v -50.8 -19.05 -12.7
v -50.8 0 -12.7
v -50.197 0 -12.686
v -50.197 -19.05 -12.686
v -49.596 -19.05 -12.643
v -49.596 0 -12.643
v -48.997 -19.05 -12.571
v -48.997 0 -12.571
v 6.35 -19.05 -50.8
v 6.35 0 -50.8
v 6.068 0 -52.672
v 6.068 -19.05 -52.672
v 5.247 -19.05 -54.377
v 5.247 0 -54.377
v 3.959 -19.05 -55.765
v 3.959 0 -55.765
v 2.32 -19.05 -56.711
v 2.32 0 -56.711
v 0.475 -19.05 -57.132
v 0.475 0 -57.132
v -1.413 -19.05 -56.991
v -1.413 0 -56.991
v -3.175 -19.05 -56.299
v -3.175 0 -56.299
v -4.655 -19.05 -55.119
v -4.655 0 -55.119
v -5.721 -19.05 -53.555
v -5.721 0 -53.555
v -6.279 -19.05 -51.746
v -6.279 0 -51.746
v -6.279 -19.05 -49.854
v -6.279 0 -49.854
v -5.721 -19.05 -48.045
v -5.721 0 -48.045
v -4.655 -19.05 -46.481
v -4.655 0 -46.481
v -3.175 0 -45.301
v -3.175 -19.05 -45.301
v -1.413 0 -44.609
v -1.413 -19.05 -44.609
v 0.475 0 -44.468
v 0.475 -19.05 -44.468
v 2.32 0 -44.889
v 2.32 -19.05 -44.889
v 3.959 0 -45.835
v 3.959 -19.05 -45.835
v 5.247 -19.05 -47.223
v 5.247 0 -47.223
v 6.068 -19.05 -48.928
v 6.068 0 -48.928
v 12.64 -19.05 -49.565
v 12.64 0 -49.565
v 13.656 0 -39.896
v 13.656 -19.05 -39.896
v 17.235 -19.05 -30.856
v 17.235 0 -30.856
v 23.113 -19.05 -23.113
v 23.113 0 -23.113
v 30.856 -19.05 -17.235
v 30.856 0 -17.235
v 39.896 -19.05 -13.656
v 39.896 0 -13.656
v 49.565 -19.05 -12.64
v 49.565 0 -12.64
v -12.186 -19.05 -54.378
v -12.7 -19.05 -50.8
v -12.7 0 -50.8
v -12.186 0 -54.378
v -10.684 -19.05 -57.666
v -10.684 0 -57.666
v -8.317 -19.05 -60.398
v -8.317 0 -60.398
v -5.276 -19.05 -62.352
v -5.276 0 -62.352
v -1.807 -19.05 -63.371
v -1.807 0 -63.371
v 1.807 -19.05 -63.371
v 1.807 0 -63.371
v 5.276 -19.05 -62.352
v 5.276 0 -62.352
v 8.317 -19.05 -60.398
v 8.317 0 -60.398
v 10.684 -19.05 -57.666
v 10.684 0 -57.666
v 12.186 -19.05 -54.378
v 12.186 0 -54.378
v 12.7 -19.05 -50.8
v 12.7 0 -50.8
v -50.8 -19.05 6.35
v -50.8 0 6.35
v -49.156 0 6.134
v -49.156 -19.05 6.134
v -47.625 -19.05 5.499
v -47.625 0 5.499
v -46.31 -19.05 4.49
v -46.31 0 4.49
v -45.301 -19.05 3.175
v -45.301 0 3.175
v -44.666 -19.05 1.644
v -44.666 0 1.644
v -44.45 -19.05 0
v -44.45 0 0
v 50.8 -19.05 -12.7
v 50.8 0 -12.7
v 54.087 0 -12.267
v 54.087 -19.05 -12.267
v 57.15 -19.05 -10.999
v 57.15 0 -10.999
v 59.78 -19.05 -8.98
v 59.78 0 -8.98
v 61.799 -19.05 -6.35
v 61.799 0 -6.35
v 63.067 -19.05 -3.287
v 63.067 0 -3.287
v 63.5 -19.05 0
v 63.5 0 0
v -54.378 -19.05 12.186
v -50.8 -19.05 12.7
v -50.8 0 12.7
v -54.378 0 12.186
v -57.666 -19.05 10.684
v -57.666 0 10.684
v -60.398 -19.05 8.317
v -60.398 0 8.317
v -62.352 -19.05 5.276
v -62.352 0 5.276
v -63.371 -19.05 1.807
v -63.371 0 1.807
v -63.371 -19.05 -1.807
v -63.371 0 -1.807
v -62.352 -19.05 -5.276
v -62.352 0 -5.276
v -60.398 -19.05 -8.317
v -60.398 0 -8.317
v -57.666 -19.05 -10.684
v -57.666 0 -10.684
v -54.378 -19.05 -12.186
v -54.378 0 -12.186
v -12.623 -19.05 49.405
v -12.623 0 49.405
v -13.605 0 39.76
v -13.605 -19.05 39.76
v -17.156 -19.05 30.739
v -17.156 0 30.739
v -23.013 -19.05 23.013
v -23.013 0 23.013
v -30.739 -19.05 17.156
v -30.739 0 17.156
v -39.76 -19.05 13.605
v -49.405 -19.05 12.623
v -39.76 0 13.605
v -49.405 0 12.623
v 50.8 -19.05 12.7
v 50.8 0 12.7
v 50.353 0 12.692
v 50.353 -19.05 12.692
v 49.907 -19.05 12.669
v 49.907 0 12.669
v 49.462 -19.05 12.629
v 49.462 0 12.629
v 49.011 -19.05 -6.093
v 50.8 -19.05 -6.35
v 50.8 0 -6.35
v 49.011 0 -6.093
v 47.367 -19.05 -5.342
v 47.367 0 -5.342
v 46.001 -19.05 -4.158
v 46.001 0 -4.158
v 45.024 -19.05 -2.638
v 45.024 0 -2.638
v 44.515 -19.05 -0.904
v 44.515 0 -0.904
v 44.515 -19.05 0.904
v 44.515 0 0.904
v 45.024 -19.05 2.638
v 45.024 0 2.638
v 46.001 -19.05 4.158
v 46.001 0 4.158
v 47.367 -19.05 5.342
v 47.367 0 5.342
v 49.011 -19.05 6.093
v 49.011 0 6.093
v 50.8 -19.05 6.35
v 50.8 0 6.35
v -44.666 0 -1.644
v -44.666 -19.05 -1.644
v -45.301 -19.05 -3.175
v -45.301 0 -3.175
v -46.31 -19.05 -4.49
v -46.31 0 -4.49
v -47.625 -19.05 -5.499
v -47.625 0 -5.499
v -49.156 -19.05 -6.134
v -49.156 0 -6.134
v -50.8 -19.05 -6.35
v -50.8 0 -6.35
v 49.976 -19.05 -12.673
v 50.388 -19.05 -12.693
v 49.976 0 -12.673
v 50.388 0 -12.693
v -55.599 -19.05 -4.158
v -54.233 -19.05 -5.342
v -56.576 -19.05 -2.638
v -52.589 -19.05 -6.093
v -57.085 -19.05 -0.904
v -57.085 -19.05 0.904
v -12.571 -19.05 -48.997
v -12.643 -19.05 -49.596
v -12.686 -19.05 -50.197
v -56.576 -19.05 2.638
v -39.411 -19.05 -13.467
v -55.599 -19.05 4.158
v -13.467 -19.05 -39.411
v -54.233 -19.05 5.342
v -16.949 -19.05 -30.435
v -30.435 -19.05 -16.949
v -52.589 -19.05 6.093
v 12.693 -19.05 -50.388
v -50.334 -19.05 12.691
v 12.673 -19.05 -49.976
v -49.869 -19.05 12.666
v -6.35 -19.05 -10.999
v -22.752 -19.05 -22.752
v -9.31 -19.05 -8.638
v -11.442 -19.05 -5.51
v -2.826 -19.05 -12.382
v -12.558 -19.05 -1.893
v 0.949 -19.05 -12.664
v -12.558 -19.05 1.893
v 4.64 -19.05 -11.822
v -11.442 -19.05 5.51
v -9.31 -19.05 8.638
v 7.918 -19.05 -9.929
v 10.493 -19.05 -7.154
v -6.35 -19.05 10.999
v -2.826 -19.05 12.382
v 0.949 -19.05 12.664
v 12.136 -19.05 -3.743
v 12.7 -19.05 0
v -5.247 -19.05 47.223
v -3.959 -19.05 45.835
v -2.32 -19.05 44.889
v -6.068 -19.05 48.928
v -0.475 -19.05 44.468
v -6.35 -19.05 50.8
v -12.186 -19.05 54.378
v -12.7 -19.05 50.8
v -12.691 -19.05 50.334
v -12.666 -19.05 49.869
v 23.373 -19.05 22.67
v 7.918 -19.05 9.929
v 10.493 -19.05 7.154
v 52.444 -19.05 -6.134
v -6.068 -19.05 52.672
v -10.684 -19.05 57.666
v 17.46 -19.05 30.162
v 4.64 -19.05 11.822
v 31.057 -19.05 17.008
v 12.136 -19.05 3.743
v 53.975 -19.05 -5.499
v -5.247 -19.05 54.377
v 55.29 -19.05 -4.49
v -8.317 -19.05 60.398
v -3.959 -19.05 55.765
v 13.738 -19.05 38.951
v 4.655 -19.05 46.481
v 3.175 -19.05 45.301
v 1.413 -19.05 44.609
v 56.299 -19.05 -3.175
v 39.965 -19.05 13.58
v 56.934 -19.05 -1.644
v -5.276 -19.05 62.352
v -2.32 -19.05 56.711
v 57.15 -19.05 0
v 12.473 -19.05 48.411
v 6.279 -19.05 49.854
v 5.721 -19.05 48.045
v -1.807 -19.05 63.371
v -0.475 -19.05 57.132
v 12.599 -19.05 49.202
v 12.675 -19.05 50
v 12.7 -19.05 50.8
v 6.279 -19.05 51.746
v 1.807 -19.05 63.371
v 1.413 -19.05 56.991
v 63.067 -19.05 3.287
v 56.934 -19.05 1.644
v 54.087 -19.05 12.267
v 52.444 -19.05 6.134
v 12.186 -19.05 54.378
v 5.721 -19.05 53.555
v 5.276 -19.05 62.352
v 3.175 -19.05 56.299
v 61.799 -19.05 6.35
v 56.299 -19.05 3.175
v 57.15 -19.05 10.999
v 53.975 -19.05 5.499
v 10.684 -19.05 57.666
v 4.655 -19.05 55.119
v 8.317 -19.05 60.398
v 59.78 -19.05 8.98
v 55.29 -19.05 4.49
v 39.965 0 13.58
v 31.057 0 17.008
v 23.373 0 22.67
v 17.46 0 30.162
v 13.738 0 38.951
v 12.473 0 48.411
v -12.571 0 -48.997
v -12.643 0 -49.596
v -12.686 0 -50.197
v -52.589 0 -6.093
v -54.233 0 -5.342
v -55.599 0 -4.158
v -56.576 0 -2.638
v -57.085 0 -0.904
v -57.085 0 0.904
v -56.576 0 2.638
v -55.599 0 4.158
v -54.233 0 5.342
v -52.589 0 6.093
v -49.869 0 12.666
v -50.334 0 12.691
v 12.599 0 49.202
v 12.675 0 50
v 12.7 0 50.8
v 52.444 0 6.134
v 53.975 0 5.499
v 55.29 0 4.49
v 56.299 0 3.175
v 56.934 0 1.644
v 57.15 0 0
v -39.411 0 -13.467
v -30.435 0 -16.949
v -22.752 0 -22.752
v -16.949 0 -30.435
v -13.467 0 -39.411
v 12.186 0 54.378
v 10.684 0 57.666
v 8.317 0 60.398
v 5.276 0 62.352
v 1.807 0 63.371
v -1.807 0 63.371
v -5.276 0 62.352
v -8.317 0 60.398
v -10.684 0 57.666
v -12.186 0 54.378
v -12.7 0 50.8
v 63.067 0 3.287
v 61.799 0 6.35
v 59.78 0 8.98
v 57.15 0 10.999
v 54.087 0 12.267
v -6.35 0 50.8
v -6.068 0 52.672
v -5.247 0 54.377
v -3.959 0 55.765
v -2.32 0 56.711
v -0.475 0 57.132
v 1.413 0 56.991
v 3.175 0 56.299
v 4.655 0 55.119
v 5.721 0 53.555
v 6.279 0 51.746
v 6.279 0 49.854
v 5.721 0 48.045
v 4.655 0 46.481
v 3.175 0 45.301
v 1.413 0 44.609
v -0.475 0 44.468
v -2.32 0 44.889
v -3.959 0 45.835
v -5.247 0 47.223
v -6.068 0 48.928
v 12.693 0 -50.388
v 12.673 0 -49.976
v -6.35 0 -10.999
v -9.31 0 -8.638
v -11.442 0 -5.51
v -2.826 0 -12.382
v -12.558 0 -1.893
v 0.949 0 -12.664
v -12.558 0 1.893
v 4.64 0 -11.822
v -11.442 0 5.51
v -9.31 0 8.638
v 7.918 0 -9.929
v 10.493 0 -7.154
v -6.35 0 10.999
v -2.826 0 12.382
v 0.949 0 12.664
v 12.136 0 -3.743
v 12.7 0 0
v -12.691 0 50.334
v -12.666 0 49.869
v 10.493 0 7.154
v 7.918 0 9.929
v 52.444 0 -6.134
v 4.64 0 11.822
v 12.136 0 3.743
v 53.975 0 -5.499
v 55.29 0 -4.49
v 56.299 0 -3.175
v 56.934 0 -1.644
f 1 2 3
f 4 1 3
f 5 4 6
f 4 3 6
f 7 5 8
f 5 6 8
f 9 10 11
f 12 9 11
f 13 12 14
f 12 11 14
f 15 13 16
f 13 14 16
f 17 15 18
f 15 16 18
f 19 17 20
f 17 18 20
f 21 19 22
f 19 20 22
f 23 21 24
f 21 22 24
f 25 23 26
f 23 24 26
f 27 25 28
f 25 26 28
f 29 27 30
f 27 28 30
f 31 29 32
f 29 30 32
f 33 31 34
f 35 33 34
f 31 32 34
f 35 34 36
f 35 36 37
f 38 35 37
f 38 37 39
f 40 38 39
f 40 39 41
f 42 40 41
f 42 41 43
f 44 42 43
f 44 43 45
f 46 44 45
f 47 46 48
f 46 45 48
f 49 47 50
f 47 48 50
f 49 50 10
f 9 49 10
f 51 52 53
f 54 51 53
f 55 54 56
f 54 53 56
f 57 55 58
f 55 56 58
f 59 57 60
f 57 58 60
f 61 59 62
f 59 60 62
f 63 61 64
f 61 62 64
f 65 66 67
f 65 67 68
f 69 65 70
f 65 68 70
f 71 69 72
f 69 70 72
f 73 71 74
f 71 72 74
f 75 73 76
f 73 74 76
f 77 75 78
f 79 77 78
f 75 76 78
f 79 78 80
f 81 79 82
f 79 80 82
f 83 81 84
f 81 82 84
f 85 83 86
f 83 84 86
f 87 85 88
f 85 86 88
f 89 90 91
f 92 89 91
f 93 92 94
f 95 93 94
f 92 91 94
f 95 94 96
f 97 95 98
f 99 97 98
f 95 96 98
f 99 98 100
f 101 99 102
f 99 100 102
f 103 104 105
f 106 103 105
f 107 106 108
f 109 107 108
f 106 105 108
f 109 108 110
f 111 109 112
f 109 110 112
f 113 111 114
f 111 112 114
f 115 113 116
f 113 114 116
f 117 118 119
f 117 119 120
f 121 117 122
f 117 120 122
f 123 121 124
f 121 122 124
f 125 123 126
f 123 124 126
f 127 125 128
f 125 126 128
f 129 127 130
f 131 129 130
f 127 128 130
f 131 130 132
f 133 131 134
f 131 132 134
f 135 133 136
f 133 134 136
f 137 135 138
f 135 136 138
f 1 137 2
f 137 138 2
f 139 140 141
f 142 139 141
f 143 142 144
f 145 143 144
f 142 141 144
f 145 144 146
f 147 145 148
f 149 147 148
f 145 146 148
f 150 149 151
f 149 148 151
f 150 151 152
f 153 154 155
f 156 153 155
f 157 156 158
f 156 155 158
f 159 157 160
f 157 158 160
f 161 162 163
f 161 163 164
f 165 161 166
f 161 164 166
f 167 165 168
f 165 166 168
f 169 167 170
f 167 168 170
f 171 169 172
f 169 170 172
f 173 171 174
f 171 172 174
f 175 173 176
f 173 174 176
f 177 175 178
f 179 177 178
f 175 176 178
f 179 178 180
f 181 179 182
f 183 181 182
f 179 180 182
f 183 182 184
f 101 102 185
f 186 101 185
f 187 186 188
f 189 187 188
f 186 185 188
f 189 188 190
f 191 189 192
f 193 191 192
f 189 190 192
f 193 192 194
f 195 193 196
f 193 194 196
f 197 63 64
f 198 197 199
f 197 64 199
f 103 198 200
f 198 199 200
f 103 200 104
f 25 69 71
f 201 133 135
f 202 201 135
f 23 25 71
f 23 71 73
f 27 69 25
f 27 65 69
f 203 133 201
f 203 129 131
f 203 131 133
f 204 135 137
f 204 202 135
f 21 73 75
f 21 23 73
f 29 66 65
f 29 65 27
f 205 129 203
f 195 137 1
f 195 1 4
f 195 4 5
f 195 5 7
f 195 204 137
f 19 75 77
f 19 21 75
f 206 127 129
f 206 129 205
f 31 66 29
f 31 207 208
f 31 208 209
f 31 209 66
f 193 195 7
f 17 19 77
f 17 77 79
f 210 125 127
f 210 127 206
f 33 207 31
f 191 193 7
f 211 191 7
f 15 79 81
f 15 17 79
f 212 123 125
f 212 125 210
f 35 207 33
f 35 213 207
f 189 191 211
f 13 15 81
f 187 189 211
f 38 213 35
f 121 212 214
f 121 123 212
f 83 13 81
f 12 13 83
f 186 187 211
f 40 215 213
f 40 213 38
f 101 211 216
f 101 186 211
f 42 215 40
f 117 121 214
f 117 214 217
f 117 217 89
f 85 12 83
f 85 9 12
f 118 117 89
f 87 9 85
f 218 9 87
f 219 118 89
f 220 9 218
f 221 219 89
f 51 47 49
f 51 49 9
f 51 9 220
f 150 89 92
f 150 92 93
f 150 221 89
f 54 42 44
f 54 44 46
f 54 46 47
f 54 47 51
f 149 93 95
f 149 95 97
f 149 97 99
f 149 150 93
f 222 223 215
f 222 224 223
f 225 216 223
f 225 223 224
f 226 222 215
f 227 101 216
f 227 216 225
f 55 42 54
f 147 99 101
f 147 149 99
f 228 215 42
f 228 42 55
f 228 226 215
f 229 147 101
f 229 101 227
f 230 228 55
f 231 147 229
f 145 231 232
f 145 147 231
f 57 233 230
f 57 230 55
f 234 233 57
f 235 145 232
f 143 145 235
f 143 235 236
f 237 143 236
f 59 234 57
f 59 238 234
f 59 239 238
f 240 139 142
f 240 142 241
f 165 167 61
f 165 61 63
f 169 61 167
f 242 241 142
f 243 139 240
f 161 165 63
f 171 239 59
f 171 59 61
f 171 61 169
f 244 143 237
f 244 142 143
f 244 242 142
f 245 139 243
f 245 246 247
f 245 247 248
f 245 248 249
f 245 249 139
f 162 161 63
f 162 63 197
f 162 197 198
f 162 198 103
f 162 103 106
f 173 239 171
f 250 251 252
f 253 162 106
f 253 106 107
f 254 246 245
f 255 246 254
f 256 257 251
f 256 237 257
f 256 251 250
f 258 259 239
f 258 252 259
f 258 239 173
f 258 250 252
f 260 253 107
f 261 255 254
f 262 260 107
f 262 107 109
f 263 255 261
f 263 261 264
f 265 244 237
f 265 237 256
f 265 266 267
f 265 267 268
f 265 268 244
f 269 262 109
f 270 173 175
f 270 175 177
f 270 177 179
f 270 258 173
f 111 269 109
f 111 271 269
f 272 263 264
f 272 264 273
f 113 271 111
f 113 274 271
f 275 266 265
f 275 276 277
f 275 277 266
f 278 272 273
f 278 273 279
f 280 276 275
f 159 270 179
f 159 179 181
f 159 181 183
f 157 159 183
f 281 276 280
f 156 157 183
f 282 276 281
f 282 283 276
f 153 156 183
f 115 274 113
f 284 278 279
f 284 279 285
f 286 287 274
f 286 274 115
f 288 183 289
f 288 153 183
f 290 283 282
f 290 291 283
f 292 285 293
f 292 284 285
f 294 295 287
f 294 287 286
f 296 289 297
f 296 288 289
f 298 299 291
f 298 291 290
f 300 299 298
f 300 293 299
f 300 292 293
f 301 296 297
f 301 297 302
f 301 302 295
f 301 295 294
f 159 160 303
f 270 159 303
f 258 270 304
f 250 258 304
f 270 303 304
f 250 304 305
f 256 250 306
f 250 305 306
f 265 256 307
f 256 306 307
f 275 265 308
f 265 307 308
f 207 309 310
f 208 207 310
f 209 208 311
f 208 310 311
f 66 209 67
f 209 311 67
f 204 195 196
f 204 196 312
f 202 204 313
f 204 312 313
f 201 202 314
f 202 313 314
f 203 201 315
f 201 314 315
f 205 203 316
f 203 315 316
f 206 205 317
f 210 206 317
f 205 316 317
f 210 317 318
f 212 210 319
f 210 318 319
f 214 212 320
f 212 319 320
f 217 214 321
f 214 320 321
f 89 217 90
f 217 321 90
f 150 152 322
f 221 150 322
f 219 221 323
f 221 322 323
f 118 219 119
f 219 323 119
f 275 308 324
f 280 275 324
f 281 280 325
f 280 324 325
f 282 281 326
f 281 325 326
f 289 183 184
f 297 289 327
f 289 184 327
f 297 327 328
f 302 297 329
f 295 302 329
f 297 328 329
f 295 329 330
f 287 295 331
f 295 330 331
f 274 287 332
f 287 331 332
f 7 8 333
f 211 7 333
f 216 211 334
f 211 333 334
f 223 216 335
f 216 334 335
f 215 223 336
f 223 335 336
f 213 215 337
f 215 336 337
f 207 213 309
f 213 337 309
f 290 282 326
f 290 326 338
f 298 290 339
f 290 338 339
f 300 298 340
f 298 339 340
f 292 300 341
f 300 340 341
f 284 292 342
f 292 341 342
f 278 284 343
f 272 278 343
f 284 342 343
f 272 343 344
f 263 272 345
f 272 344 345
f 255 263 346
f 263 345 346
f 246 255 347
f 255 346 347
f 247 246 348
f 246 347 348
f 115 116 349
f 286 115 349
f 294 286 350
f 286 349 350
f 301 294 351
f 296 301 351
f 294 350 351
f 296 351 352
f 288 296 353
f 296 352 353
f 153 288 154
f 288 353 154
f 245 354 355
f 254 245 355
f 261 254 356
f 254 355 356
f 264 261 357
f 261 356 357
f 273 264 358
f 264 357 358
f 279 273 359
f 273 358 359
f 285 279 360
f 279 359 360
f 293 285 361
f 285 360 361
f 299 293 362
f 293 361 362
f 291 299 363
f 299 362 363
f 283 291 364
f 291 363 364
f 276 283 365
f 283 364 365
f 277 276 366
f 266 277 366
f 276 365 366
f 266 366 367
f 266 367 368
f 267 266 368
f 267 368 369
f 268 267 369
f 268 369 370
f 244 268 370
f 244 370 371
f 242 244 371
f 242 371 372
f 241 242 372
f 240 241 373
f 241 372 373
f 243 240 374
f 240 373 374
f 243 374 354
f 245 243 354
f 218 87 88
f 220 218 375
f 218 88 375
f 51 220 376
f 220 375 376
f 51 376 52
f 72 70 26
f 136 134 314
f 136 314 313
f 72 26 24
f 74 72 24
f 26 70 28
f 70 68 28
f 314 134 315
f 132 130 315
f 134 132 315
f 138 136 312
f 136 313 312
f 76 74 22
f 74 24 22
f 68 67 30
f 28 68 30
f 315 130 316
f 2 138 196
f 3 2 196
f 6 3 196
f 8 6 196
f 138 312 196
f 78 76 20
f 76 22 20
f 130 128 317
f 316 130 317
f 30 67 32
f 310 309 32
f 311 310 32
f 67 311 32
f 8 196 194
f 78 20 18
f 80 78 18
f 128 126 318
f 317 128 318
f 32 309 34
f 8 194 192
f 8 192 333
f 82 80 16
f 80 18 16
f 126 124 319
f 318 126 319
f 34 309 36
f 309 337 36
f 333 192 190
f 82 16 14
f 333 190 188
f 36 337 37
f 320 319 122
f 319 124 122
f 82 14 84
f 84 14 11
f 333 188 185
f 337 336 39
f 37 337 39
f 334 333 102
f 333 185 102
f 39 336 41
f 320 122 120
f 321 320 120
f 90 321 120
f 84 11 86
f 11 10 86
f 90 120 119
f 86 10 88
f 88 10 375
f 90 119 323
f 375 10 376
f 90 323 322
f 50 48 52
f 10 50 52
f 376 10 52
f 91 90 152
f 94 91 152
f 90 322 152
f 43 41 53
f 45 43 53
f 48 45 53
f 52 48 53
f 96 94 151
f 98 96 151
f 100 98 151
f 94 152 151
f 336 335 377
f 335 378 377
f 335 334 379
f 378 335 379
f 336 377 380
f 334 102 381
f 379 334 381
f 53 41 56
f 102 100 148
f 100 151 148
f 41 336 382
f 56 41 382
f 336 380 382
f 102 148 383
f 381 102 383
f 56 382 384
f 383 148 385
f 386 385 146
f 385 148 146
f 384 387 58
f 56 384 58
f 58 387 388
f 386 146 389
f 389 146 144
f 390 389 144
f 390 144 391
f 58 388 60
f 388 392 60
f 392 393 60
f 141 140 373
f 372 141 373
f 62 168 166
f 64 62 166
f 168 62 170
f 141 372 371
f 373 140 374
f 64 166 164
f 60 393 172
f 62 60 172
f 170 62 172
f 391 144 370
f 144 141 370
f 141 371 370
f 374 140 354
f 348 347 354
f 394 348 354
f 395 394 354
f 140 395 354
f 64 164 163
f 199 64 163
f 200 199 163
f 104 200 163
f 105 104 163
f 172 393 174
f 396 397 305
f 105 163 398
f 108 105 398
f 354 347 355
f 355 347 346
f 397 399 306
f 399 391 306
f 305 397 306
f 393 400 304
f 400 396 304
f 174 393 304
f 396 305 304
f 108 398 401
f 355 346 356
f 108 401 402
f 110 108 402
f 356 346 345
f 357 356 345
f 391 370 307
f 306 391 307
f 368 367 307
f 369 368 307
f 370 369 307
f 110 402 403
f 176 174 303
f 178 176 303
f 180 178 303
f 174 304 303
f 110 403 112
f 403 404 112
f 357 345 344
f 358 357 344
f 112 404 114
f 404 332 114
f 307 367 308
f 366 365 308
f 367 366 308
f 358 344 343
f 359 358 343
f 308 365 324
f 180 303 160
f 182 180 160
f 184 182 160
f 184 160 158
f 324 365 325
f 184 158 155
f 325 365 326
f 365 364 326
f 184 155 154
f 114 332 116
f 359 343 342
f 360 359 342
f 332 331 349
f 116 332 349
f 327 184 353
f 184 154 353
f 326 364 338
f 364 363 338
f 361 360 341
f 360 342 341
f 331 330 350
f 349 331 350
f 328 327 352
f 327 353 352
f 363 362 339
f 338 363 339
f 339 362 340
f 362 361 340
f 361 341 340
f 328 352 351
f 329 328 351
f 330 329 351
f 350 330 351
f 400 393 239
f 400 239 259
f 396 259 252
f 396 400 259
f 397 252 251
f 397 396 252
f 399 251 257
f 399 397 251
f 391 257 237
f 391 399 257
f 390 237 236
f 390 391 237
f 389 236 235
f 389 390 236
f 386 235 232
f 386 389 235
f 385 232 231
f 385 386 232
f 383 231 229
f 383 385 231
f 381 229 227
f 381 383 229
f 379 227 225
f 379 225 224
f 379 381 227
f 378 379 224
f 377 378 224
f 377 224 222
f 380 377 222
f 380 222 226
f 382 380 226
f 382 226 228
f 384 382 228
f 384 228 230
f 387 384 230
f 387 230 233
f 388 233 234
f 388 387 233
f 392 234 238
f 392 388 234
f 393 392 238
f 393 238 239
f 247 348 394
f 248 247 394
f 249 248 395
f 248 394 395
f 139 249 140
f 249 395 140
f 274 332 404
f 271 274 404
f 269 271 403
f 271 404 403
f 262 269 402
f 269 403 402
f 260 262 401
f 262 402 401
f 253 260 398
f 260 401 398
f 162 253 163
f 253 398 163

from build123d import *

# Parameters (mm, degrees)
F0_R     = 12.7
F1_DEPTH = 19.05


with BuildPart() as f1:
    # F0 (on Front) → F1 (new body)
    with BuildSketch(Plane.XZ):
        with BuildLine():
            Line((12.5552676618, 50.8), (6.35, 50.8))
            ThreePointArc((6.35, 50.8), (0, 44.45), (-6.35, 50.8))
            Line((-6.35, 50.8), (-12.7, 50.8))
            ThreePointArc((-12.7, 50.8), (-12.6547477412, 50.1030744688), (-12.623195922, 49.4053944235))
            ThreePointArc((-12.623195922, 49.4053944235), (-0.5027005097, 38.1099530262), (12.4733220574, 48.4112269151))
            ThreePointArc((12.4733220574, 48.4112269151), (12.4943375608, 49.6062980822), (12.5552676618, 50.8))
        make_face()
        with BuildLine():
            ThreePointArc((-6.35, 50.8), (0, 57.15), (6.35, 50.8))
            Line((6.35, 50.8), (12.5552676618, 50.8))
            Line((12.5552676618, 50.8), (12.7, 50.8))
            ThreePointArc((12.7, 50.8), (0, 63.5), (-12.7, 50.8))
            Line((-12.7, 50.8), (-6.35, 50.8))
        make_face()
        with BuildLine():
            Line((12.7, 50.8), (12.5552676618, 50.8))
            ThreePointArc((12.5552676618, 50.8), (12.4943375608, 49.6062980822), (12.4733220574, 48.4112269151))
            ThreePointArc((12.4733220574, 48.4112269151), (12.6432035127, 49.6002479693), (12.7, 50.8))
        make_face()
        with BuildLine():
            ThreePointArc((-12.623195922, 49.4053944235), (-12.6547477412, 50.1030744688), (-12.7, 50.8))
            ThreePointArc((-12.7, 50.8), (-12.6807844436, 50.1016405688), (-12.623195922, 49.4053944235))
        make_face()
        with BuildLine():
            ThreePointArc((49.4621205903, 12.6293340555), (23.373403019, 22.6698095536), (12.4733220574, 48.4112269151))
            ThreePointArc((12.4733220574, 48.4112269151), (-0.5027005097, 38.1099530262), (-12.623195922, 49.4053944235))
            ThreePointArc((-12.623195922, 49.4053944235), (-23.0125550108, 23.0125550108), (-49.4053944235, 12.623195922))
            ThreePointArc((-49.4053944235, 12.623195922), (-41.3395166397, 8.4728539813), (-38.1, 0))
            ThreePointArc((-38.1, 0), (-41.2035577614, -8.3185513379), (-48.9973695056, -12.571416917))
            ThreePointArc((-48.9973695056, -12.571416917), (-22.7523388598, -22.7523388598), (-12.571416917, -48.9973695056))
            ThreePointArc((-12.571416917, -48.9973695056), (0.2857229322, -38.1032144853), (12.6397809271, -49.5647113232))
            ThreePointArc((12.6397809271, -49.5647113232), (23.1125114369, -23.1125114369), (49.5647113232, -12.6397809271))
            ThreePointArc((49.5647113232, -12.6397809271), (38.1001046657, -0.0515606332), (49.4621205903, 12.6293340555))
        make_face()
        Circle(F0_R, mode=Mode.SUBTRACT)
        with BuildLine():
            ThreePointArc((50.8, 12.7), (50.1313911561, 12.6584030193), (49.4621205903, 12.6293340555))
            ThreePointArc((49.4621205903, 12.6293340555), (38.1001046657, -0.0515606332), (49.5647113232, -12.6397809271))
            ThreePointArc((49.5647113232, -12.6397809271), (50.1826156034, -12.6645582134), (50.8, -12.7))
            Line((50.8, -12.7), (50.8, -6.35))
            ThreePointArc((50.8, -6.35), (44.45, 0), (50.8, 6.35))
            Line((50.8, 6.35), (50.8, 12.7))
        make_face()
        with BuildLine():
            ThreePointArc((50.8, 12.7), (50.1301278125, 12.6823212092), (49.4621205903, 12.6293340555))
            ThreePointArc((49.4621205903, 12.6293340555), (50.1313911561, 12.6584030193), (50.8, 12.7))
        make_face()
        with BuildLine():
            ThreePointArc((-50.8, 12.7), (-50.1030744688, 12.6547477412), (-49.4053944235, 12.623195922))
            ThreePointArc((-49.4053944235, 12.623195922), (-50.1016405688, 12.6807844436), (-50.8, 12.7))
        make_face()
        with BuildLine():
            ThreePointArc((-38.1, 0), (-41.3395166397, 8.4728539813), (-49.4053944235, 12.623195922))
            ThreePointArc((-49.4053944235, 12.623195922), (-50.1030744688, 12.6547477412), (-50.8, 12.7))
            Line((-50.8, 12.7), (-50.8, 6.35))
            ThreePointArc((-50.8, 6.35), (-46.3098719395, 4.4901280605), (-44.45, 0))
            ThreePointArc((-44.45, 0), (-46.3098719395, -4.4901280605), (-50.8, -6.35))
            Line((-50.8, -6.35), (-50.8, -12.7))
            ThreePointArc((-50.8, -12.7), (-49.8995176161, -12.6240323908), (-48.9973695056, -12.571416917))
            ThreePointArc((-48.9973695056, -12.571416917), (-41.2035577614, -8.3185513379), (-38.1, 0))
        make_face()
        with BuildLine():
            ThreePointArc((63.5, 0), (59.7802561211, 8.9802561211), (50.8, 12.7))
            Line((50.8, 12.7), (50.8, 6.35))
            ThreePointArc((50.8, 6.35), (55.2901280605, 4.4901280605), (57.15, 0))
            ThreePointArc((57.15, 0), (55.2901280605, -4.4901280605), (50.8, -6.35))
            Line((50.8, -6.35), (50.8, -12.7))
            ThreePointArc((50.8, -12.7), (59.7802561211, -8.9802561211), (63.5, 0))
        make_face()
        with BuildLine():
            ThreePointArc((50.8, -12.7), (50.1826156034, -12.6645582134), (49.5647113232, -12.6397809271))
            ThreePointArc((49.5647113232, -12.6397809271), (50.1816221924, -12.6849362981), (50.8, -12.7))
        make_face()
        with BuildLine():
            Line((-50.8, 6.35), (-50.8, 12.7))
            ThreePointArc((-50.8, 12.7), (-63.5, 0), (-50.8, -12.7))
            Line((-50.8, -12.7), (-50.8, -6.35))
            ThreePointArc((-50.8, -6.35), (-57.15, 0), (-50.8, 6.35))
        make_face()
        with BuildLine():
            ThreePointArc((12.7, -50.8), (12.6645582134, -50.1826156034), (12.6397809271, -49.5647113232))
            ThreePointArc((12.6397809271, -49.5647113232), (0.2857229322, -38.1032144853), (-12.571416917, -48.9973695056))
            ThreePointArc((-12.571416917, -48.9973695056), (-12.6240323908, -49.8995176161), (-12.7, -50.8))
            Line((-12.7, -50.8), (-6.35, -50.8))
            ThreePointArc((-6.35, -50.8), (0, -44.45), (6.35, -50.8))
            Line((6.35, -50.8), (12.7, -50.8))
        make_face()
        with BuildLine():
            ThreePointArc((12.7, -50.8), (12.6849362981, -50.1816221924), (12.6397809271, -49.5647113232))
            ThreePointArc((12.6397809271, -49.5647113232), (12.6645582134, -50.1826156034), (12.7, -50.8))
        make_face()
        with BuildLine():
            ThreePointArc((-50.8, -12.7), (-49.8963946784, -12.6678134429), (-48.9973695056, -12.571416917))
            ThreePointArc((-48.9973695056, -12.571416917), (-49.8995176161, -12.6240323908), (-50.8, -12.7))
        make_face()
        with BuildLine():
            ThreePointArc((-12.7, -50.8), (0, -63.5), (12.7, -50.8))
            Line((12.7, -50.8), (6.35, -50.8))
            ThreePointArc((6.35, -50.8), (0, -57.15), (-6.35, -50.8))
            Line((-6.35, -50.8), (-12.7, -50.8))
        make_face()
        with BuildLine():
            ThreePointArc((-12.7, -50.8), (-12.6240323908, -49.8995176161), (-12.571416917, -48.9973695056))
            ThreePointArc((-12.571416917, -48.9973695056), (-12.6678134429, -49.8963946784), (-12.7, -50.8))
        make_face()
    extrude(amount=F1_DEPTH)


solid = f1.part
